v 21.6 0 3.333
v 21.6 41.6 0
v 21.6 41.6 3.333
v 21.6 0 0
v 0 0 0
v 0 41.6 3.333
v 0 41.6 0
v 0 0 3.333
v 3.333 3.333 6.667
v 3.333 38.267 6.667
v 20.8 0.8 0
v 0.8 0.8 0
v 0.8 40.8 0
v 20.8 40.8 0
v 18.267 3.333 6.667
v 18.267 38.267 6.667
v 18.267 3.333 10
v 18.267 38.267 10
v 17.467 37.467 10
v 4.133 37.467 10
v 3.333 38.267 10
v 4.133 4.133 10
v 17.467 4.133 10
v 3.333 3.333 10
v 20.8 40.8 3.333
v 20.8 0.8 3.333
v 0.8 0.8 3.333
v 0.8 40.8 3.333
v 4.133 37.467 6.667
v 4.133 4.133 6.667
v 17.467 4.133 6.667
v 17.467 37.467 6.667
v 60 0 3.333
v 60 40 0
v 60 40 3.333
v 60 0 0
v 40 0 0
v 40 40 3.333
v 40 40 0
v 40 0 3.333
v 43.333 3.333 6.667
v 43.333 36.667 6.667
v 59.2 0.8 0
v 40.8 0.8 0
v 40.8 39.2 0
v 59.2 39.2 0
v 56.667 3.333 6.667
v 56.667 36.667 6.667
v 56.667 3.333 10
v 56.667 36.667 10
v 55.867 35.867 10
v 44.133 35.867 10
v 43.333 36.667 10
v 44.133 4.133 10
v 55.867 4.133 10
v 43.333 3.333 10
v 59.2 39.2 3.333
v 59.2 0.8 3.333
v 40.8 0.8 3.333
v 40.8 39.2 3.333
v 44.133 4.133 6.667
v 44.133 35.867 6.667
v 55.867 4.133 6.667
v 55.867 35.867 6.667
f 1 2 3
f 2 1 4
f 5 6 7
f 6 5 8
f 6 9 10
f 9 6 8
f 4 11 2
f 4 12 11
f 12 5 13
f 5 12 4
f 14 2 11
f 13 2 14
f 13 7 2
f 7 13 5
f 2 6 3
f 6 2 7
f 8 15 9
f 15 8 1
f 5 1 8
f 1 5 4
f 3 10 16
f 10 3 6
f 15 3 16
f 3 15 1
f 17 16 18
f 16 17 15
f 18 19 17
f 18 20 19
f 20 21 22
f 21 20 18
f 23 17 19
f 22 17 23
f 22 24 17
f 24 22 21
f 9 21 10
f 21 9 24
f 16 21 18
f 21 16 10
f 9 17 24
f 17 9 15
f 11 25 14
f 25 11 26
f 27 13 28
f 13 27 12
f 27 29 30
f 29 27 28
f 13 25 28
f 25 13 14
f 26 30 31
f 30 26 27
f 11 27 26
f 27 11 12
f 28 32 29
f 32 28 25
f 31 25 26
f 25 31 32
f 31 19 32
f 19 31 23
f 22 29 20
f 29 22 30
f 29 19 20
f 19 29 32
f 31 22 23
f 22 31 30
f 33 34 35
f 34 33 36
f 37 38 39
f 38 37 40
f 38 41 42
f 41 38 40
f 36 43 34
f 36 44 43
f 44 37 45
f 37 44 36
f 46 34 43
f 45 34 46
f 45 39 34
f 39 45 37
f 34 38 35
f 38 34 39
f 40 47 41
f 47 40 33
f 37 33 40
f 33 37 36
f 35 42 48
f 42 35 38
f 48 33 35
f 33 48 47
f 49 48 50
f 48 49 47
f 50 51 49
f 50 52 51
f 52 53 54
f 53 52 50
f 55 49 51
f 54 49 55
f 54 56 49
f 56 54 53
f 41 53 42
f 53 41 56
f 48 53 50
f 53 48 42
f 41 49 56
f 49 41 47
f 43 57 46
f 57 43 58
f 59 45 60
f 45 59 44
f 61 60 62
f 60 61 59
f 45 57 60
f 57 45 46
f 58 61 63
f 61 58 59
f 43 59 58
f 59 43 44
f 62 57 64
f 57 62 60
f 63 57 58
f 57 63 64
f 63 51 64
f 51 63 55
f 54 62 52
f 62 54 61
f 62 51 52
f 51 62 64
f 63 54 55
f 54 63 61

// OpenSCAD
// file: dremel_body.scad
$fn = 49;

body_width = 35;
body_height = 31;
body_length = 110;
screew_head_diameter = 8.2;
screew_neck_diameter = 3;
screew_leg_diameter = 3;
screew_head_dilatation = 1;
screew_head_height = 3;
screew_hole_shift = 1;



module dremel_tool_body(body_width, body_height, body_length)
{
    part_length = body_length / 4;
    
    translate([0, body_width/2, body_height/2])
    rotate([0, 90,0])
    {
        translate([0,0,0*part_length])
        cylinder(d1=17, d2=25, h=part_length);
        translate([0,0,1*part_length])
        cylinder(d1=25, d2=27, h=part_length);
        translate([0,0,2*part_length])
        cylinder(d1=27, d2=25, h=part_length);
        translate([0,0,3*part_length])
        cylinder(d1=25, d2=17, h=part_length);
    }
}

module holder_body(body_width, body_height, body_length)
{    
    cube([body_length, body_width, body_height]);
}

module screew_holes(body_width, body_length)
{
    translate([5,5,0])
    screew_hole(body_height);
    translate([5,body_width-5,0])
    screew_hole(body_height);
    translate([body_length-5,5,0])
    screew_hole(body_height);
    translate([body_length-5,body_width-5,0])
    screew_hole(body_height);
}

module screew_legs(body_width)
{
    translate([5,5,0])
    screew_leg(body_width, screew_hole_shift);
    translate([5,body_width-5,0])
    screew_leg(body_width, screew_hole_shift);
    translate([body_length-5,5,0])
    screew_leg(body_width, screew_hole_shift);
    translate([body_length-5,body_width-5,0])
    screew_leg(body_width, screew_hole_shift);
}

//translate([-20,-20,0])
//screew_hole(body_height);

module screew_hole(body_height)
{
    screew_leg(body_height, screew_hole_shift);
//    cylinder(d=screew_head_diameter,h=screew_hole_shift);
    translate([0,0,0])
    cylinder(d1=screew_head_diameter,d2=screew_neck_diameter,h=screew_head_dilatation+screew_head_height);
}

module screew_leg(body_width, screew_hole_shift)
{
    cylinder(d=screew_leg_diameter,h=body_width+screew_hole_shift);
}
// main file
include<dremel_body.scad>

wall = 0.8;
table_height = 10;


//adapter_clearance = 0;
adapter_width = 20;
adapter_length = 40;


hole_adapter(adapter_width, adapter_length, wall);
translate ([40, 0, 0])
hole_adapter(adapter_width-2*wall, adapter_length-2*wall, wall);

module hole_adapter(adapter_width, adapter_length, wall)
{
    difference()
    {
        hole_adapter_case(adapter_width, adapter_length, wall);
        translate([wall, wall, 0])
        hole_adapter_case(adapter_width, adapter_length);
    }
}

module hole_adapter_case(adapter_width, adapter_length, wall=0)
{
    adapter_height_third = table_height / 3;
    
    hull()
    {
        cube ([adapter_width+2*wall, adapter_length+2*wall, adapter_height_third]);

        translate([adapter_height_third, adapter_height_third, adapter_height_third])
        cube ([adapter_width-2*adapter_height_third+2*wall, adapter_length+2*wall-2*adapter_height_third, adapter_height_third]);
    }
        translate([adapter_height_third,adapter_height_third,2*adapter_height_third])
        cube ([adapter_width+2*wall-2*adapter_height_third, adapter_length+2*wall-2*adapter_height_third, adapter_height_third]);
}
